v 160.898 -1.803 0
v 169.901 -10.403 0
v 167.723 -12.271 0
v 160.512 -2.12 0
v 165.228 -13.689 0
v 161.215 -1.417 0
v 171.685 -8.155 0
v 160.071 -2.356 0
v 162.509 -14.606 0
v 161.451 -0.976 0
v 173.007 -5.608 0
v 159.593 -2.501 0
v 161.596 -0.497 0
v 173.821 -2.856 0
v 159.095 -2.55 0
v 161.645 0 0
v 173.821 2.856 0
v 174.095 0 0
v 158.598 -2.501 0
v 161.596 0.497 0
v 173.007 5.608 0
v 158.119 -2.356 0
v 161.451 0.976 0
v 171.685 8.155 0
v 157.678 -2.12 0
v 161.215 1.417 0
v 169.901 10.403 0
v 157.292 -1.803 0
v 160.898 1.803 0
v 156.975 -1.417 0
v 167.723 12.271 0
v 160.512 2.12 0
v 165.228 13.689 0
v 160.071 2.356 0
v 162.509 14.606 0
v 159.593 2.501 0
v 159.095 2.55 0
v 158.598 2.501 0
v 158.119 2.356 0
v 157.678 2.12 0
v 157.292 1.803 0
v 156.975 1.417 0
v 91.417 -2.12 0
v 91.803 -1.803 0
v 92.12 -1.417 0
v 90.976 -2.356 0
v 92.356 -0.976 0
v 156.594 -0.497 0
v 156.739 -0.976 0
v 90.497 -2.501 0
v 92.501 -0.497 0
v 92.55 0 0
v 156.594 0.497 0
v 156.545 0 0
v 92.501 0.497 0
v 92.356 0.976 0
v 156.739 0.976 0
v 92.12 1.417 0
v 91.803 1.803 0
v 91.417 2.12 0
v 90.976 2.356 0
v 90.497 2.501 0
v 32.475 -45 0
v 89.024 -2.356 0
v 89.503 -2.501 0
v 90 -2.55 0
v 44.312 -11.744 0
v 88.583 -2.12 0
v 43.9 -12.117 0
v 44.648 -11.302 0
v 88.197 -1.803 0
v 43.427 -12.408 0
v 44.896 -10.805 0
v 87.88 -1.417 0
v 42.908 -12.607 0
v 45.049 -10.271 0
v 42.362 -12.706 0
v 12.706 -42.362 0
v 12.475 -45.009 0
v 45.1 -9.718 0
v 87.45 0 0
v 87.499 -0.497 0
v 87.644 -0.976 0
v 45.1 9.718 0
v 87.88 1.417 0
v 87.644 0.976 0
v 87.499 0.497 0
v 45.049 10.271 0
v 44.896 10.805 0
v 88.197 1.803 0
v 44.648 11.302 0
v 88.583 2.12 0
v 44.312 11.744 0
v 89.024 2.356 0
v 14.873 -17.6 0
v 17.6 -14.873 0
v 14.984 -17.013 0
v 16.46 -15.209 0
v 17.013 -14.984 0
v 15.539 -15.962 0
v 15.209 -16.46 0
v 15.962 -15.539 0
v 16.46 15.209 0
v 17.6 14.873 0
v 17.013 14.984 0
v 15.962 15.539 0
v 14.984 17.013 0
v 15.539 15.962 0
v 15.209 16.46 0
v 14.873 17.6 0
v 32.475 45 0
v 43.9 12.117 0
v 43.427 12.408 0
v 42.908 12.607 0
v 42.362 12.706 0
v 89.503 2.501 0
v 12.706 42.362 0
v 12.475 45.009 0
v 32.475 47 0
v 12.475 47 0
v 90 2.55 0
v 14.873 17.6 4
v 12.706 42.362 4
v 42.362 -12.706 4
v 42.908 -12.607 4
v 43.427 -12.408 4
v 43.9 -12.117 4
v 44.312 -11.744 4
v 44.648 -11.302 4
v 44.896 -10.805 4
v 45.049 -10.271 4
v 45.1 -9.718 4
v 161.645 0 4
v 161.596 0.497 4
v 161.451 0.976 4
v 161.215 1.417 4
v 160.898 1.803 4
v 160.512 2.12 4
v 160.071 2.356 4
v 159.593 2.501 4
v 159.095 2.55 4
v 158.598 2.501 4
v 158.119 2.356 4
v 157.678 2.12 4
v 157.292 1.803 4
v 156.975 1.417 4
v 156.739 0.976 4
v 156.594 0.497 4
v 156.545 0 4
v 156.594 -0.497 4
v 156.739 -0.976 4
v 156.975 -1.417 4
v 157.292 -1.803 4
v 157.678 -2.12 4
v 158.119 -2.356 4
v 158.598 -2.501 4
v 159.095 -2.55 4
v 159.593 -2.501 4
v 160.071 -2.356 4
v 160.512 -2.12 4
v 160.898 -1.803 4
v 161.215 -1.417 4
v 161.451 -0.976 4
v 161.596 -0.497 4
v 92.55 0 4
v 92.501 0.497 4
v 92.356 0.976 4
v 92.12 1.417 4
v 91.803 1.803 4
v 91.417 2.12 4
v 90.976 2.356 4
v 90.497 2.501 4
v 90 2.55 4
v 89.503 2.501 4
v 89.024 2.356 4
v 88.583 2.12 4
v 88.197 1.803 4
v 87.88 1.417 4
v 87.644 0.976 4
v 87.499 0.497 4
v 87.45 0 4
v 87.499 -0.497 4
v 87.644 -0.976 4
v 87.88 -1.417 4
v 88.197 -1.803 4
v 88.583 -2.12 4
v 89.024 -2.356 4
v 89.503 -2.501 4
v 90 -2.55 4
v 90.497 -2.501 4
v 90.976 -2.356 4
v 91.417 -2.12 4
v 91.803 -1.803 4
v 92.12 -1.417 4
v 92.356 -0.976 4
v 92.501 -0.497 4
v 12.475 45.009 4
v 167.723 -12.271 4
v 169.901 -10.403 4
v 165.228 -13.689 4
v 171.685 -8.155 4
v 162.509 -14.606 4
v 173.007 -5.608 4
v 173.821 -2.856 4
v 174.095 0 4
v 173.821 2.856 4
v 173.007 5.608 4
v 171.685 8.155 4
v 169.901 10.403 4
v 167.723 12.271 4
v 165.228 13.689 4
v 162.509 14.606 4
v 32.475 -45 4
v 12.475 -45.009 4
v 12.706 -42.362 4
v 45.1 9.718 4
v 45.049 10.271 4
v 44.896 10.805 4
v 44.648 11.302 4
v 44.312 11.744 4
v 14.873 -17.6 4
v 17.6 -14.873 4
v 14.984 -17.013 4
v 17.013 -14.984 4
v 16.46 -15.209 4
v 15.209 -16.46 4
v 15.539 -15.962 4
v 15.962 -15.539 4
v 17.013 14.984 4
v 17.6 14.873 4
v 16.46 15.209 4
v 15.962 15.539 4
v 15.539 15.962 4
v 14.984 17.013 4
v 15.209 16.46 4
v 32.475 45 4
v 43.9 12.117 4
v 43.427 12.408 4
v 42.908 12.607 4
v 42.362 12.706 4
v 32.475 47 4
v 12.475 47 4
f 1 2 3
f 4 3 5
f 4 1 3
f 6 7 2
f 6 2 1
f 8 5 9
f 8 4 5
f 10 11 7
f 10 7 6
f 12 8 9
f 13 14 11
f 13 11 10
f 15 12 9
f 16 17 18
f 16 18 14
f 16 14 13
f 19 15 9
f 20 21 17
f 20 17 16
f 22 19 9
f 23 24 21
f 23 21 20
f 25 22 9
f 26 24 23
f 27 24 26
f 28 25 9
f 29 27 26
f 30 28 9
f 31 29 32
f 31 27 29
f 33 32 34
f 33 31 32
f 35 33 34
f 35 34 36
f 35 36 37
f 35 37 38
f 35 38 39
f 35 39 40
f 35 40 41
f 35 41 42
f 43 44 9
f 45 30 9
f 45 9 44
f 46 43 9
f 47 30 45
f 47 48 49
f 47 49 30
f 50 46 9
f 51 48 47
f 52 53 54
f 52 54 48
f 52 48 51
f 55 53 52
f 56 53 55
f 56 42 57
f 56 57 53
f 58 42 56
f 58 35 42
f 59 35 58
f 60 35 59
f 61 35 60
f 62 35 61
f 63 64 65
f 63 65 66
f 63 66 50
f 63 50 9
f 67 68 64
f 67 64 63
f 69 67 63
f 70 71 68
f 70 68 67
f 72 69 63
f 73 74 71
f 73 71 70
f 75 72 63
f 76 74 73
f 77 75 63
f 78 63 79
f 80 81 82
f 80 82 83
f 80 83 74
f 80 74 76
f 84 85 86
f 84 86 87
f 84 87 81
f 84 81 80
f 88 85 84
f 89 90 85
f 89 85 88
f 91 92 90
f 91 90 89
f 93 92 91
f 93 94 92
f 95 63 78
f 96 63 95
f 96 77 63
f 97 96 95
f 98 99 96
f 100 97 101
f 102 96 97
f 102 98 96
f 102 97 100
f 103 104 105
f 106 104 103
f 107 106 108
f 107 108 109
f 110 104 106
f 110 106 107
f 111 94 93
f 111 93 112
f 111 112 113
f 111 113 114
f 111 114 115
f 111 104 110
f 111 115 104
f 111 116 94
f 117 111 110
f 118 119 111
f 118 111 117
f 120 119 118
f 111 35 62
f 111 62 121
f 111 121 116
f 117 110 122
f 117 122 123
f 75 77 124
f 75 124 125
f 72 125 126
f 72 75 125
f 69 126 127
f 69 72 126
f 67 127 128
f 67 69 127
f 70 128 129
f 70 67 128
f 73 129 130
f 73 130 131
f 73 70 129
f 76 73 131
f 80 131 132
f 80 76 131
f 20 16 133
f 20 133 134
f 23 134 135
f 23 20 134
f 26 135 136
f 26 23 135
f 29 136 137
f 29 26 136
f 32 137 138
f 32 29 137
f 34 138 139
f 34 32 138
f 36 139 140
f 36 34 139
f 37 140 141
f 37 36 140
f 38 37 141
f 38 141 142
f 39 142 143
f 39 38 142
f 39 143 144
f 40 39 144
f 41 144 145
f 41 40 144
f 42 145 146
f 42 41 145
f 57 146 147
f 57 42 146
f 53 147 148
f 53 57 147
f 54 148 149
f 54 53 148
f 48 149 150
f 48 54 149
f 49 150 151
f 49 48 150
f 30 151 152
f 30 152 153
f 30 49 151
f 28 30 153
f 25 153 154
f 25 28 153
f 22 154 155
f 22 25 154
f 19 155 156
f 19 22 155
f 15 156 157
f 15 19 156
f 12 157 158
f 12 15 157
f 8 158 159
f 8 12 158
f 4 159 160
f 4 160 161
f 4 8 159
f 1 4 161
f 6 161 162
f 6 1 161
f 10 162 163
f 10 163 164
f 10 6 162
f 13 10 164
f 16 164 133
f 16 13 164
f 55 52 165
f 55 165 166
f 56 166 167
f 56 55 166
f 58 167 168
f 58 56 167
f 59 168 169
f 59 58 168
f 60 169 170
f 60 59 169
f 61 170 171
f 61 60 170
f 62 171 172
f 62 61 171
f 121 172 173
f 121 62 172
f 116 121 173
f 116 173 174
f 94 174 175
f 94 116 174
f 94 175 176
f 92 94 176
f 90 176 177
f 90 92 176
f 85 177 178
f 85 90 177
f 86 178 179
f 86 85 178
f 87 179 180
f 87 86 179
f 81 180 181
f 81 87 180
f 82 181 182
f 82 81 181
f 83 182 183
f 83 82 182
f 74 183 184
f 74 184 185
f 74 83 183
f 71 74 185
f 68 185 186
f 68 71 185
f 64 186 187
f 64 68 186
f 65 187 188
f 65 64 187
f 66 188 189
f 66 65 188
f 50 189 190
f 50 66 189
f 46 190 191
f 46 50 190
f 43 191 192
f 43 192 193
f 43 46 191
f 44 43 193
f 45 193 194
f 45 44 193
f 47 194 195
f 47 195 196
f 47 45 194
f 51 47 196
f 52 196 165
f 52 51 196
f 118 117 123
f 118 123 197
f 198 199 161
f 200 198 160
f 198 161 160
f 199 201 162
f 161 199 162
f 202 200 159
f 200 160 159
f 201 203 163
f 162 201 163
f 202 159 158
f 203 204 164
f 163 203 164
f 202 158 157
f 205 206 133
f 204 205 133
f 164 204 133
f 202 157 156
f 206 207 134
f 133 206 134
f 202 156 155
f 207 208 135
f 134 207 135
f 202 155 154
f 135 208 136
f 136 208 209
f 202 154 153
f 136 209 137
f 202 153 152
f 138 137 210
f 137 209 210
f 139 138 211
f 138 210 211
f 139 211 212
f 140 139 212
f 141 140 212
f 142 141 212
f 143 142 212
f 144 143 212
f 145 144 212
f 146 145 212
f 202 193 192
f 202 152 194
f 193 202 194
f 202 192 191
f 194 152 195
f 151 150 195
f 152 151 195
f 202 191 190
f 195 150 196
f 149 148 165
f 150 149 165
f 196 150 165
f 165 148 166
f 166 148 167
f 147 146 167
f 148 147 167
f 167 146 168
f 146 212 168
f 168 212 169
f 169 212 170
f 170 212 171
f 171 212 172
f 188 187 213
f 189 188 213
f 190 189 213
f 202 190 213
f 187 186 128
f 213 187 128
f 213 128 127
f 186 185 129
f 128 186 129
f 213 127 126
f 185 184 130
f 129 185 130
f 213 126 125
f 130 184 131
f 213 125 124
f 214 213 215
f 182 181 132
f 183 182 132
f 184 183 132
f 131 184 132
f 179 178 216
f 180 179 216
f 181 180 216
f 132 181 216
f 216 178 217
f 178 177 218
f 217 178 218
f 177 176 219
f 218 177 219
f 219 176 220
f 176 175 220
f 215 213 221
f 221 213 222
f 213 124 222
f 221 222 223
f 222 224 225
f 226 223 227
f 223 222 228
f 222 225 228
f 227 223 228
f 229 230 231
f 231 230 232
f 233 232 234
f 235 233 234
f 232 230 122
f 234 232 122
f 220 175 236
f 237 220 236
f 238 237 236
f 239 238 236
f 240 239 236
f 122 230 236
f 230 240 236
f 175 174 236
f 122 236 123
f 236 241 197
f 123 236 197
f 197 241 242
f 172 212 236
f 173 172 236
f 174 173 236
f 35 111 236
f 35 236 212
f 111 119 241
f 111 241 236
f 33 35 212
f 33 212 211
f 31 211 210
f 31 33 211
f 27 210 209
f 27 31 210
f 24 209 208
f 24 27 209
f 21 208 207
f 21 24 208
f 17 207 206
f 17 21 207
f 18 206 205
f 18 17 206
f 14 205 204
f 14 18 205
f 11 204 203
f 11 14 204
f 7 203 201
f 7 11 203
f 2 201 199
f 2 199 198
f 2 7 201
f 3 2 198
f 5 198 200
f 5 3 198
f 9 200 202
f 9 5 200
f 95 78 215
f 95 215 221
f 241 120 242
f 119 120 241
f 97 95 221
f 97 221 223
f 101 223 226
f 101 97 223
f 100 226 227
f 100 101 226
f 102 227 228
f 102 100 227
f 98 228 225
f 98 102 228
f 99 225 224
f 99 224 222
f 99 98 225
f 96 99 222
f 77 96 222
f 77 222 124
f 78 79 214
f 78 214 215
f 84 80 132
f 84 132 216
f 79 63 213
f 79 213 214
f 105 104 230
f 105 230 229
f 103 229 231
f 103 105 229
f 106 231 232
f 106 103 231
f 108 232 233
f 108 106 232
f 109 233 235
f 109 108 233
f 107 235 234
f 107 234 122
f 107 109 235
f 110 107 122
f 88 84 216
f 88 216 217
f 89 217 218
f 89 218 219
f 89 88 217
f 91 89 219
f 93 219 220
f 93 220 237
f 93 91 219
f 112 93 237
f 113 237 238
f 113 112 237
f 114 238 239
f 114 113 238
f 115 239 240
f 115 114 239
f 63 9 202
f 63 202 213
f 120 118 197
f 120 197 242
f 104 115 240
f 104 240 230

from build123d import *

# Parameters (mm, degrees)
SKETCH1_R           = 2.55
BOSS_EXTRUDE1_DEPTH = 4


with BuildPart() as part:
    # Sketch1 → Boss-Extrude1 (new body)
    with BuildSketch(Plane.XY):
        with BuildLine():
            Line((14.872885109, 17.599965411), (12.706250758, 42.361500851))
            Line((12.706250758, 42.361500851), (12.474619372, 45.008716695))
            Line((12.474619372, 45.008716695), (12.474619372, 47))
            Line((12.474619372, 47), (32.474619372, 47))
            Line((32.474619372, 47), (32.474619372, 45))
            Line((32.474619372, 45), (162.509181482, 14.606317485))
            ThreePointArc((162.509181482, 14.606317485), (174.095167783, 0), (162.509181482, -14.606317485))
            Line((162.509181482, -14.606317485), (32.474619372, -45))
            Line((32.474619372, -45), (12.474619372, -45.008716695))
            Line((12.474619372, -45.008716695), (12.706250758, -42.361500851))
            Line((12.706250758, -42.361500851), (14.872885109, -17.599965411))
            ThreePointArc((14.872885109, -17.599965411), (15.740145918, -15.740145918), (17.599965411, -14.872885109))
            Line((17.599965411, -14.872885109), (42.361500851, -12.706250758))
            ThreePointArc((42.361500851, -12.706250758), (44.311843411, -11.744427787), (45.1, -9.717669606))
            Line((45.1, -9.717669606), (45.1, 9.717669606))
            ThreePointArc((45.1, 9.717669606), (44.311843411, 11.744427787), (42.361500851, 12.706250758))
            Line((42.361500851, 12.706250758), (17.599965411, 14.872885109))
            ThreePointArc((17.599965411, 14.872885109), (15.740145918, 15.740145918), (14.872885109, 17.599965411))
        make_face()
        with Locations((159.095167783, 0)):
            Circle(SKETCH1_R, mode=Mode.SUBTRACT)
        with Locations((90, 0)):
            Circle(SKETCH1_R, mode=Mode.SUBTRACT)
    extrude(amount=BOSS_EXTRUDE1_DEPTH)


solid = part.part
